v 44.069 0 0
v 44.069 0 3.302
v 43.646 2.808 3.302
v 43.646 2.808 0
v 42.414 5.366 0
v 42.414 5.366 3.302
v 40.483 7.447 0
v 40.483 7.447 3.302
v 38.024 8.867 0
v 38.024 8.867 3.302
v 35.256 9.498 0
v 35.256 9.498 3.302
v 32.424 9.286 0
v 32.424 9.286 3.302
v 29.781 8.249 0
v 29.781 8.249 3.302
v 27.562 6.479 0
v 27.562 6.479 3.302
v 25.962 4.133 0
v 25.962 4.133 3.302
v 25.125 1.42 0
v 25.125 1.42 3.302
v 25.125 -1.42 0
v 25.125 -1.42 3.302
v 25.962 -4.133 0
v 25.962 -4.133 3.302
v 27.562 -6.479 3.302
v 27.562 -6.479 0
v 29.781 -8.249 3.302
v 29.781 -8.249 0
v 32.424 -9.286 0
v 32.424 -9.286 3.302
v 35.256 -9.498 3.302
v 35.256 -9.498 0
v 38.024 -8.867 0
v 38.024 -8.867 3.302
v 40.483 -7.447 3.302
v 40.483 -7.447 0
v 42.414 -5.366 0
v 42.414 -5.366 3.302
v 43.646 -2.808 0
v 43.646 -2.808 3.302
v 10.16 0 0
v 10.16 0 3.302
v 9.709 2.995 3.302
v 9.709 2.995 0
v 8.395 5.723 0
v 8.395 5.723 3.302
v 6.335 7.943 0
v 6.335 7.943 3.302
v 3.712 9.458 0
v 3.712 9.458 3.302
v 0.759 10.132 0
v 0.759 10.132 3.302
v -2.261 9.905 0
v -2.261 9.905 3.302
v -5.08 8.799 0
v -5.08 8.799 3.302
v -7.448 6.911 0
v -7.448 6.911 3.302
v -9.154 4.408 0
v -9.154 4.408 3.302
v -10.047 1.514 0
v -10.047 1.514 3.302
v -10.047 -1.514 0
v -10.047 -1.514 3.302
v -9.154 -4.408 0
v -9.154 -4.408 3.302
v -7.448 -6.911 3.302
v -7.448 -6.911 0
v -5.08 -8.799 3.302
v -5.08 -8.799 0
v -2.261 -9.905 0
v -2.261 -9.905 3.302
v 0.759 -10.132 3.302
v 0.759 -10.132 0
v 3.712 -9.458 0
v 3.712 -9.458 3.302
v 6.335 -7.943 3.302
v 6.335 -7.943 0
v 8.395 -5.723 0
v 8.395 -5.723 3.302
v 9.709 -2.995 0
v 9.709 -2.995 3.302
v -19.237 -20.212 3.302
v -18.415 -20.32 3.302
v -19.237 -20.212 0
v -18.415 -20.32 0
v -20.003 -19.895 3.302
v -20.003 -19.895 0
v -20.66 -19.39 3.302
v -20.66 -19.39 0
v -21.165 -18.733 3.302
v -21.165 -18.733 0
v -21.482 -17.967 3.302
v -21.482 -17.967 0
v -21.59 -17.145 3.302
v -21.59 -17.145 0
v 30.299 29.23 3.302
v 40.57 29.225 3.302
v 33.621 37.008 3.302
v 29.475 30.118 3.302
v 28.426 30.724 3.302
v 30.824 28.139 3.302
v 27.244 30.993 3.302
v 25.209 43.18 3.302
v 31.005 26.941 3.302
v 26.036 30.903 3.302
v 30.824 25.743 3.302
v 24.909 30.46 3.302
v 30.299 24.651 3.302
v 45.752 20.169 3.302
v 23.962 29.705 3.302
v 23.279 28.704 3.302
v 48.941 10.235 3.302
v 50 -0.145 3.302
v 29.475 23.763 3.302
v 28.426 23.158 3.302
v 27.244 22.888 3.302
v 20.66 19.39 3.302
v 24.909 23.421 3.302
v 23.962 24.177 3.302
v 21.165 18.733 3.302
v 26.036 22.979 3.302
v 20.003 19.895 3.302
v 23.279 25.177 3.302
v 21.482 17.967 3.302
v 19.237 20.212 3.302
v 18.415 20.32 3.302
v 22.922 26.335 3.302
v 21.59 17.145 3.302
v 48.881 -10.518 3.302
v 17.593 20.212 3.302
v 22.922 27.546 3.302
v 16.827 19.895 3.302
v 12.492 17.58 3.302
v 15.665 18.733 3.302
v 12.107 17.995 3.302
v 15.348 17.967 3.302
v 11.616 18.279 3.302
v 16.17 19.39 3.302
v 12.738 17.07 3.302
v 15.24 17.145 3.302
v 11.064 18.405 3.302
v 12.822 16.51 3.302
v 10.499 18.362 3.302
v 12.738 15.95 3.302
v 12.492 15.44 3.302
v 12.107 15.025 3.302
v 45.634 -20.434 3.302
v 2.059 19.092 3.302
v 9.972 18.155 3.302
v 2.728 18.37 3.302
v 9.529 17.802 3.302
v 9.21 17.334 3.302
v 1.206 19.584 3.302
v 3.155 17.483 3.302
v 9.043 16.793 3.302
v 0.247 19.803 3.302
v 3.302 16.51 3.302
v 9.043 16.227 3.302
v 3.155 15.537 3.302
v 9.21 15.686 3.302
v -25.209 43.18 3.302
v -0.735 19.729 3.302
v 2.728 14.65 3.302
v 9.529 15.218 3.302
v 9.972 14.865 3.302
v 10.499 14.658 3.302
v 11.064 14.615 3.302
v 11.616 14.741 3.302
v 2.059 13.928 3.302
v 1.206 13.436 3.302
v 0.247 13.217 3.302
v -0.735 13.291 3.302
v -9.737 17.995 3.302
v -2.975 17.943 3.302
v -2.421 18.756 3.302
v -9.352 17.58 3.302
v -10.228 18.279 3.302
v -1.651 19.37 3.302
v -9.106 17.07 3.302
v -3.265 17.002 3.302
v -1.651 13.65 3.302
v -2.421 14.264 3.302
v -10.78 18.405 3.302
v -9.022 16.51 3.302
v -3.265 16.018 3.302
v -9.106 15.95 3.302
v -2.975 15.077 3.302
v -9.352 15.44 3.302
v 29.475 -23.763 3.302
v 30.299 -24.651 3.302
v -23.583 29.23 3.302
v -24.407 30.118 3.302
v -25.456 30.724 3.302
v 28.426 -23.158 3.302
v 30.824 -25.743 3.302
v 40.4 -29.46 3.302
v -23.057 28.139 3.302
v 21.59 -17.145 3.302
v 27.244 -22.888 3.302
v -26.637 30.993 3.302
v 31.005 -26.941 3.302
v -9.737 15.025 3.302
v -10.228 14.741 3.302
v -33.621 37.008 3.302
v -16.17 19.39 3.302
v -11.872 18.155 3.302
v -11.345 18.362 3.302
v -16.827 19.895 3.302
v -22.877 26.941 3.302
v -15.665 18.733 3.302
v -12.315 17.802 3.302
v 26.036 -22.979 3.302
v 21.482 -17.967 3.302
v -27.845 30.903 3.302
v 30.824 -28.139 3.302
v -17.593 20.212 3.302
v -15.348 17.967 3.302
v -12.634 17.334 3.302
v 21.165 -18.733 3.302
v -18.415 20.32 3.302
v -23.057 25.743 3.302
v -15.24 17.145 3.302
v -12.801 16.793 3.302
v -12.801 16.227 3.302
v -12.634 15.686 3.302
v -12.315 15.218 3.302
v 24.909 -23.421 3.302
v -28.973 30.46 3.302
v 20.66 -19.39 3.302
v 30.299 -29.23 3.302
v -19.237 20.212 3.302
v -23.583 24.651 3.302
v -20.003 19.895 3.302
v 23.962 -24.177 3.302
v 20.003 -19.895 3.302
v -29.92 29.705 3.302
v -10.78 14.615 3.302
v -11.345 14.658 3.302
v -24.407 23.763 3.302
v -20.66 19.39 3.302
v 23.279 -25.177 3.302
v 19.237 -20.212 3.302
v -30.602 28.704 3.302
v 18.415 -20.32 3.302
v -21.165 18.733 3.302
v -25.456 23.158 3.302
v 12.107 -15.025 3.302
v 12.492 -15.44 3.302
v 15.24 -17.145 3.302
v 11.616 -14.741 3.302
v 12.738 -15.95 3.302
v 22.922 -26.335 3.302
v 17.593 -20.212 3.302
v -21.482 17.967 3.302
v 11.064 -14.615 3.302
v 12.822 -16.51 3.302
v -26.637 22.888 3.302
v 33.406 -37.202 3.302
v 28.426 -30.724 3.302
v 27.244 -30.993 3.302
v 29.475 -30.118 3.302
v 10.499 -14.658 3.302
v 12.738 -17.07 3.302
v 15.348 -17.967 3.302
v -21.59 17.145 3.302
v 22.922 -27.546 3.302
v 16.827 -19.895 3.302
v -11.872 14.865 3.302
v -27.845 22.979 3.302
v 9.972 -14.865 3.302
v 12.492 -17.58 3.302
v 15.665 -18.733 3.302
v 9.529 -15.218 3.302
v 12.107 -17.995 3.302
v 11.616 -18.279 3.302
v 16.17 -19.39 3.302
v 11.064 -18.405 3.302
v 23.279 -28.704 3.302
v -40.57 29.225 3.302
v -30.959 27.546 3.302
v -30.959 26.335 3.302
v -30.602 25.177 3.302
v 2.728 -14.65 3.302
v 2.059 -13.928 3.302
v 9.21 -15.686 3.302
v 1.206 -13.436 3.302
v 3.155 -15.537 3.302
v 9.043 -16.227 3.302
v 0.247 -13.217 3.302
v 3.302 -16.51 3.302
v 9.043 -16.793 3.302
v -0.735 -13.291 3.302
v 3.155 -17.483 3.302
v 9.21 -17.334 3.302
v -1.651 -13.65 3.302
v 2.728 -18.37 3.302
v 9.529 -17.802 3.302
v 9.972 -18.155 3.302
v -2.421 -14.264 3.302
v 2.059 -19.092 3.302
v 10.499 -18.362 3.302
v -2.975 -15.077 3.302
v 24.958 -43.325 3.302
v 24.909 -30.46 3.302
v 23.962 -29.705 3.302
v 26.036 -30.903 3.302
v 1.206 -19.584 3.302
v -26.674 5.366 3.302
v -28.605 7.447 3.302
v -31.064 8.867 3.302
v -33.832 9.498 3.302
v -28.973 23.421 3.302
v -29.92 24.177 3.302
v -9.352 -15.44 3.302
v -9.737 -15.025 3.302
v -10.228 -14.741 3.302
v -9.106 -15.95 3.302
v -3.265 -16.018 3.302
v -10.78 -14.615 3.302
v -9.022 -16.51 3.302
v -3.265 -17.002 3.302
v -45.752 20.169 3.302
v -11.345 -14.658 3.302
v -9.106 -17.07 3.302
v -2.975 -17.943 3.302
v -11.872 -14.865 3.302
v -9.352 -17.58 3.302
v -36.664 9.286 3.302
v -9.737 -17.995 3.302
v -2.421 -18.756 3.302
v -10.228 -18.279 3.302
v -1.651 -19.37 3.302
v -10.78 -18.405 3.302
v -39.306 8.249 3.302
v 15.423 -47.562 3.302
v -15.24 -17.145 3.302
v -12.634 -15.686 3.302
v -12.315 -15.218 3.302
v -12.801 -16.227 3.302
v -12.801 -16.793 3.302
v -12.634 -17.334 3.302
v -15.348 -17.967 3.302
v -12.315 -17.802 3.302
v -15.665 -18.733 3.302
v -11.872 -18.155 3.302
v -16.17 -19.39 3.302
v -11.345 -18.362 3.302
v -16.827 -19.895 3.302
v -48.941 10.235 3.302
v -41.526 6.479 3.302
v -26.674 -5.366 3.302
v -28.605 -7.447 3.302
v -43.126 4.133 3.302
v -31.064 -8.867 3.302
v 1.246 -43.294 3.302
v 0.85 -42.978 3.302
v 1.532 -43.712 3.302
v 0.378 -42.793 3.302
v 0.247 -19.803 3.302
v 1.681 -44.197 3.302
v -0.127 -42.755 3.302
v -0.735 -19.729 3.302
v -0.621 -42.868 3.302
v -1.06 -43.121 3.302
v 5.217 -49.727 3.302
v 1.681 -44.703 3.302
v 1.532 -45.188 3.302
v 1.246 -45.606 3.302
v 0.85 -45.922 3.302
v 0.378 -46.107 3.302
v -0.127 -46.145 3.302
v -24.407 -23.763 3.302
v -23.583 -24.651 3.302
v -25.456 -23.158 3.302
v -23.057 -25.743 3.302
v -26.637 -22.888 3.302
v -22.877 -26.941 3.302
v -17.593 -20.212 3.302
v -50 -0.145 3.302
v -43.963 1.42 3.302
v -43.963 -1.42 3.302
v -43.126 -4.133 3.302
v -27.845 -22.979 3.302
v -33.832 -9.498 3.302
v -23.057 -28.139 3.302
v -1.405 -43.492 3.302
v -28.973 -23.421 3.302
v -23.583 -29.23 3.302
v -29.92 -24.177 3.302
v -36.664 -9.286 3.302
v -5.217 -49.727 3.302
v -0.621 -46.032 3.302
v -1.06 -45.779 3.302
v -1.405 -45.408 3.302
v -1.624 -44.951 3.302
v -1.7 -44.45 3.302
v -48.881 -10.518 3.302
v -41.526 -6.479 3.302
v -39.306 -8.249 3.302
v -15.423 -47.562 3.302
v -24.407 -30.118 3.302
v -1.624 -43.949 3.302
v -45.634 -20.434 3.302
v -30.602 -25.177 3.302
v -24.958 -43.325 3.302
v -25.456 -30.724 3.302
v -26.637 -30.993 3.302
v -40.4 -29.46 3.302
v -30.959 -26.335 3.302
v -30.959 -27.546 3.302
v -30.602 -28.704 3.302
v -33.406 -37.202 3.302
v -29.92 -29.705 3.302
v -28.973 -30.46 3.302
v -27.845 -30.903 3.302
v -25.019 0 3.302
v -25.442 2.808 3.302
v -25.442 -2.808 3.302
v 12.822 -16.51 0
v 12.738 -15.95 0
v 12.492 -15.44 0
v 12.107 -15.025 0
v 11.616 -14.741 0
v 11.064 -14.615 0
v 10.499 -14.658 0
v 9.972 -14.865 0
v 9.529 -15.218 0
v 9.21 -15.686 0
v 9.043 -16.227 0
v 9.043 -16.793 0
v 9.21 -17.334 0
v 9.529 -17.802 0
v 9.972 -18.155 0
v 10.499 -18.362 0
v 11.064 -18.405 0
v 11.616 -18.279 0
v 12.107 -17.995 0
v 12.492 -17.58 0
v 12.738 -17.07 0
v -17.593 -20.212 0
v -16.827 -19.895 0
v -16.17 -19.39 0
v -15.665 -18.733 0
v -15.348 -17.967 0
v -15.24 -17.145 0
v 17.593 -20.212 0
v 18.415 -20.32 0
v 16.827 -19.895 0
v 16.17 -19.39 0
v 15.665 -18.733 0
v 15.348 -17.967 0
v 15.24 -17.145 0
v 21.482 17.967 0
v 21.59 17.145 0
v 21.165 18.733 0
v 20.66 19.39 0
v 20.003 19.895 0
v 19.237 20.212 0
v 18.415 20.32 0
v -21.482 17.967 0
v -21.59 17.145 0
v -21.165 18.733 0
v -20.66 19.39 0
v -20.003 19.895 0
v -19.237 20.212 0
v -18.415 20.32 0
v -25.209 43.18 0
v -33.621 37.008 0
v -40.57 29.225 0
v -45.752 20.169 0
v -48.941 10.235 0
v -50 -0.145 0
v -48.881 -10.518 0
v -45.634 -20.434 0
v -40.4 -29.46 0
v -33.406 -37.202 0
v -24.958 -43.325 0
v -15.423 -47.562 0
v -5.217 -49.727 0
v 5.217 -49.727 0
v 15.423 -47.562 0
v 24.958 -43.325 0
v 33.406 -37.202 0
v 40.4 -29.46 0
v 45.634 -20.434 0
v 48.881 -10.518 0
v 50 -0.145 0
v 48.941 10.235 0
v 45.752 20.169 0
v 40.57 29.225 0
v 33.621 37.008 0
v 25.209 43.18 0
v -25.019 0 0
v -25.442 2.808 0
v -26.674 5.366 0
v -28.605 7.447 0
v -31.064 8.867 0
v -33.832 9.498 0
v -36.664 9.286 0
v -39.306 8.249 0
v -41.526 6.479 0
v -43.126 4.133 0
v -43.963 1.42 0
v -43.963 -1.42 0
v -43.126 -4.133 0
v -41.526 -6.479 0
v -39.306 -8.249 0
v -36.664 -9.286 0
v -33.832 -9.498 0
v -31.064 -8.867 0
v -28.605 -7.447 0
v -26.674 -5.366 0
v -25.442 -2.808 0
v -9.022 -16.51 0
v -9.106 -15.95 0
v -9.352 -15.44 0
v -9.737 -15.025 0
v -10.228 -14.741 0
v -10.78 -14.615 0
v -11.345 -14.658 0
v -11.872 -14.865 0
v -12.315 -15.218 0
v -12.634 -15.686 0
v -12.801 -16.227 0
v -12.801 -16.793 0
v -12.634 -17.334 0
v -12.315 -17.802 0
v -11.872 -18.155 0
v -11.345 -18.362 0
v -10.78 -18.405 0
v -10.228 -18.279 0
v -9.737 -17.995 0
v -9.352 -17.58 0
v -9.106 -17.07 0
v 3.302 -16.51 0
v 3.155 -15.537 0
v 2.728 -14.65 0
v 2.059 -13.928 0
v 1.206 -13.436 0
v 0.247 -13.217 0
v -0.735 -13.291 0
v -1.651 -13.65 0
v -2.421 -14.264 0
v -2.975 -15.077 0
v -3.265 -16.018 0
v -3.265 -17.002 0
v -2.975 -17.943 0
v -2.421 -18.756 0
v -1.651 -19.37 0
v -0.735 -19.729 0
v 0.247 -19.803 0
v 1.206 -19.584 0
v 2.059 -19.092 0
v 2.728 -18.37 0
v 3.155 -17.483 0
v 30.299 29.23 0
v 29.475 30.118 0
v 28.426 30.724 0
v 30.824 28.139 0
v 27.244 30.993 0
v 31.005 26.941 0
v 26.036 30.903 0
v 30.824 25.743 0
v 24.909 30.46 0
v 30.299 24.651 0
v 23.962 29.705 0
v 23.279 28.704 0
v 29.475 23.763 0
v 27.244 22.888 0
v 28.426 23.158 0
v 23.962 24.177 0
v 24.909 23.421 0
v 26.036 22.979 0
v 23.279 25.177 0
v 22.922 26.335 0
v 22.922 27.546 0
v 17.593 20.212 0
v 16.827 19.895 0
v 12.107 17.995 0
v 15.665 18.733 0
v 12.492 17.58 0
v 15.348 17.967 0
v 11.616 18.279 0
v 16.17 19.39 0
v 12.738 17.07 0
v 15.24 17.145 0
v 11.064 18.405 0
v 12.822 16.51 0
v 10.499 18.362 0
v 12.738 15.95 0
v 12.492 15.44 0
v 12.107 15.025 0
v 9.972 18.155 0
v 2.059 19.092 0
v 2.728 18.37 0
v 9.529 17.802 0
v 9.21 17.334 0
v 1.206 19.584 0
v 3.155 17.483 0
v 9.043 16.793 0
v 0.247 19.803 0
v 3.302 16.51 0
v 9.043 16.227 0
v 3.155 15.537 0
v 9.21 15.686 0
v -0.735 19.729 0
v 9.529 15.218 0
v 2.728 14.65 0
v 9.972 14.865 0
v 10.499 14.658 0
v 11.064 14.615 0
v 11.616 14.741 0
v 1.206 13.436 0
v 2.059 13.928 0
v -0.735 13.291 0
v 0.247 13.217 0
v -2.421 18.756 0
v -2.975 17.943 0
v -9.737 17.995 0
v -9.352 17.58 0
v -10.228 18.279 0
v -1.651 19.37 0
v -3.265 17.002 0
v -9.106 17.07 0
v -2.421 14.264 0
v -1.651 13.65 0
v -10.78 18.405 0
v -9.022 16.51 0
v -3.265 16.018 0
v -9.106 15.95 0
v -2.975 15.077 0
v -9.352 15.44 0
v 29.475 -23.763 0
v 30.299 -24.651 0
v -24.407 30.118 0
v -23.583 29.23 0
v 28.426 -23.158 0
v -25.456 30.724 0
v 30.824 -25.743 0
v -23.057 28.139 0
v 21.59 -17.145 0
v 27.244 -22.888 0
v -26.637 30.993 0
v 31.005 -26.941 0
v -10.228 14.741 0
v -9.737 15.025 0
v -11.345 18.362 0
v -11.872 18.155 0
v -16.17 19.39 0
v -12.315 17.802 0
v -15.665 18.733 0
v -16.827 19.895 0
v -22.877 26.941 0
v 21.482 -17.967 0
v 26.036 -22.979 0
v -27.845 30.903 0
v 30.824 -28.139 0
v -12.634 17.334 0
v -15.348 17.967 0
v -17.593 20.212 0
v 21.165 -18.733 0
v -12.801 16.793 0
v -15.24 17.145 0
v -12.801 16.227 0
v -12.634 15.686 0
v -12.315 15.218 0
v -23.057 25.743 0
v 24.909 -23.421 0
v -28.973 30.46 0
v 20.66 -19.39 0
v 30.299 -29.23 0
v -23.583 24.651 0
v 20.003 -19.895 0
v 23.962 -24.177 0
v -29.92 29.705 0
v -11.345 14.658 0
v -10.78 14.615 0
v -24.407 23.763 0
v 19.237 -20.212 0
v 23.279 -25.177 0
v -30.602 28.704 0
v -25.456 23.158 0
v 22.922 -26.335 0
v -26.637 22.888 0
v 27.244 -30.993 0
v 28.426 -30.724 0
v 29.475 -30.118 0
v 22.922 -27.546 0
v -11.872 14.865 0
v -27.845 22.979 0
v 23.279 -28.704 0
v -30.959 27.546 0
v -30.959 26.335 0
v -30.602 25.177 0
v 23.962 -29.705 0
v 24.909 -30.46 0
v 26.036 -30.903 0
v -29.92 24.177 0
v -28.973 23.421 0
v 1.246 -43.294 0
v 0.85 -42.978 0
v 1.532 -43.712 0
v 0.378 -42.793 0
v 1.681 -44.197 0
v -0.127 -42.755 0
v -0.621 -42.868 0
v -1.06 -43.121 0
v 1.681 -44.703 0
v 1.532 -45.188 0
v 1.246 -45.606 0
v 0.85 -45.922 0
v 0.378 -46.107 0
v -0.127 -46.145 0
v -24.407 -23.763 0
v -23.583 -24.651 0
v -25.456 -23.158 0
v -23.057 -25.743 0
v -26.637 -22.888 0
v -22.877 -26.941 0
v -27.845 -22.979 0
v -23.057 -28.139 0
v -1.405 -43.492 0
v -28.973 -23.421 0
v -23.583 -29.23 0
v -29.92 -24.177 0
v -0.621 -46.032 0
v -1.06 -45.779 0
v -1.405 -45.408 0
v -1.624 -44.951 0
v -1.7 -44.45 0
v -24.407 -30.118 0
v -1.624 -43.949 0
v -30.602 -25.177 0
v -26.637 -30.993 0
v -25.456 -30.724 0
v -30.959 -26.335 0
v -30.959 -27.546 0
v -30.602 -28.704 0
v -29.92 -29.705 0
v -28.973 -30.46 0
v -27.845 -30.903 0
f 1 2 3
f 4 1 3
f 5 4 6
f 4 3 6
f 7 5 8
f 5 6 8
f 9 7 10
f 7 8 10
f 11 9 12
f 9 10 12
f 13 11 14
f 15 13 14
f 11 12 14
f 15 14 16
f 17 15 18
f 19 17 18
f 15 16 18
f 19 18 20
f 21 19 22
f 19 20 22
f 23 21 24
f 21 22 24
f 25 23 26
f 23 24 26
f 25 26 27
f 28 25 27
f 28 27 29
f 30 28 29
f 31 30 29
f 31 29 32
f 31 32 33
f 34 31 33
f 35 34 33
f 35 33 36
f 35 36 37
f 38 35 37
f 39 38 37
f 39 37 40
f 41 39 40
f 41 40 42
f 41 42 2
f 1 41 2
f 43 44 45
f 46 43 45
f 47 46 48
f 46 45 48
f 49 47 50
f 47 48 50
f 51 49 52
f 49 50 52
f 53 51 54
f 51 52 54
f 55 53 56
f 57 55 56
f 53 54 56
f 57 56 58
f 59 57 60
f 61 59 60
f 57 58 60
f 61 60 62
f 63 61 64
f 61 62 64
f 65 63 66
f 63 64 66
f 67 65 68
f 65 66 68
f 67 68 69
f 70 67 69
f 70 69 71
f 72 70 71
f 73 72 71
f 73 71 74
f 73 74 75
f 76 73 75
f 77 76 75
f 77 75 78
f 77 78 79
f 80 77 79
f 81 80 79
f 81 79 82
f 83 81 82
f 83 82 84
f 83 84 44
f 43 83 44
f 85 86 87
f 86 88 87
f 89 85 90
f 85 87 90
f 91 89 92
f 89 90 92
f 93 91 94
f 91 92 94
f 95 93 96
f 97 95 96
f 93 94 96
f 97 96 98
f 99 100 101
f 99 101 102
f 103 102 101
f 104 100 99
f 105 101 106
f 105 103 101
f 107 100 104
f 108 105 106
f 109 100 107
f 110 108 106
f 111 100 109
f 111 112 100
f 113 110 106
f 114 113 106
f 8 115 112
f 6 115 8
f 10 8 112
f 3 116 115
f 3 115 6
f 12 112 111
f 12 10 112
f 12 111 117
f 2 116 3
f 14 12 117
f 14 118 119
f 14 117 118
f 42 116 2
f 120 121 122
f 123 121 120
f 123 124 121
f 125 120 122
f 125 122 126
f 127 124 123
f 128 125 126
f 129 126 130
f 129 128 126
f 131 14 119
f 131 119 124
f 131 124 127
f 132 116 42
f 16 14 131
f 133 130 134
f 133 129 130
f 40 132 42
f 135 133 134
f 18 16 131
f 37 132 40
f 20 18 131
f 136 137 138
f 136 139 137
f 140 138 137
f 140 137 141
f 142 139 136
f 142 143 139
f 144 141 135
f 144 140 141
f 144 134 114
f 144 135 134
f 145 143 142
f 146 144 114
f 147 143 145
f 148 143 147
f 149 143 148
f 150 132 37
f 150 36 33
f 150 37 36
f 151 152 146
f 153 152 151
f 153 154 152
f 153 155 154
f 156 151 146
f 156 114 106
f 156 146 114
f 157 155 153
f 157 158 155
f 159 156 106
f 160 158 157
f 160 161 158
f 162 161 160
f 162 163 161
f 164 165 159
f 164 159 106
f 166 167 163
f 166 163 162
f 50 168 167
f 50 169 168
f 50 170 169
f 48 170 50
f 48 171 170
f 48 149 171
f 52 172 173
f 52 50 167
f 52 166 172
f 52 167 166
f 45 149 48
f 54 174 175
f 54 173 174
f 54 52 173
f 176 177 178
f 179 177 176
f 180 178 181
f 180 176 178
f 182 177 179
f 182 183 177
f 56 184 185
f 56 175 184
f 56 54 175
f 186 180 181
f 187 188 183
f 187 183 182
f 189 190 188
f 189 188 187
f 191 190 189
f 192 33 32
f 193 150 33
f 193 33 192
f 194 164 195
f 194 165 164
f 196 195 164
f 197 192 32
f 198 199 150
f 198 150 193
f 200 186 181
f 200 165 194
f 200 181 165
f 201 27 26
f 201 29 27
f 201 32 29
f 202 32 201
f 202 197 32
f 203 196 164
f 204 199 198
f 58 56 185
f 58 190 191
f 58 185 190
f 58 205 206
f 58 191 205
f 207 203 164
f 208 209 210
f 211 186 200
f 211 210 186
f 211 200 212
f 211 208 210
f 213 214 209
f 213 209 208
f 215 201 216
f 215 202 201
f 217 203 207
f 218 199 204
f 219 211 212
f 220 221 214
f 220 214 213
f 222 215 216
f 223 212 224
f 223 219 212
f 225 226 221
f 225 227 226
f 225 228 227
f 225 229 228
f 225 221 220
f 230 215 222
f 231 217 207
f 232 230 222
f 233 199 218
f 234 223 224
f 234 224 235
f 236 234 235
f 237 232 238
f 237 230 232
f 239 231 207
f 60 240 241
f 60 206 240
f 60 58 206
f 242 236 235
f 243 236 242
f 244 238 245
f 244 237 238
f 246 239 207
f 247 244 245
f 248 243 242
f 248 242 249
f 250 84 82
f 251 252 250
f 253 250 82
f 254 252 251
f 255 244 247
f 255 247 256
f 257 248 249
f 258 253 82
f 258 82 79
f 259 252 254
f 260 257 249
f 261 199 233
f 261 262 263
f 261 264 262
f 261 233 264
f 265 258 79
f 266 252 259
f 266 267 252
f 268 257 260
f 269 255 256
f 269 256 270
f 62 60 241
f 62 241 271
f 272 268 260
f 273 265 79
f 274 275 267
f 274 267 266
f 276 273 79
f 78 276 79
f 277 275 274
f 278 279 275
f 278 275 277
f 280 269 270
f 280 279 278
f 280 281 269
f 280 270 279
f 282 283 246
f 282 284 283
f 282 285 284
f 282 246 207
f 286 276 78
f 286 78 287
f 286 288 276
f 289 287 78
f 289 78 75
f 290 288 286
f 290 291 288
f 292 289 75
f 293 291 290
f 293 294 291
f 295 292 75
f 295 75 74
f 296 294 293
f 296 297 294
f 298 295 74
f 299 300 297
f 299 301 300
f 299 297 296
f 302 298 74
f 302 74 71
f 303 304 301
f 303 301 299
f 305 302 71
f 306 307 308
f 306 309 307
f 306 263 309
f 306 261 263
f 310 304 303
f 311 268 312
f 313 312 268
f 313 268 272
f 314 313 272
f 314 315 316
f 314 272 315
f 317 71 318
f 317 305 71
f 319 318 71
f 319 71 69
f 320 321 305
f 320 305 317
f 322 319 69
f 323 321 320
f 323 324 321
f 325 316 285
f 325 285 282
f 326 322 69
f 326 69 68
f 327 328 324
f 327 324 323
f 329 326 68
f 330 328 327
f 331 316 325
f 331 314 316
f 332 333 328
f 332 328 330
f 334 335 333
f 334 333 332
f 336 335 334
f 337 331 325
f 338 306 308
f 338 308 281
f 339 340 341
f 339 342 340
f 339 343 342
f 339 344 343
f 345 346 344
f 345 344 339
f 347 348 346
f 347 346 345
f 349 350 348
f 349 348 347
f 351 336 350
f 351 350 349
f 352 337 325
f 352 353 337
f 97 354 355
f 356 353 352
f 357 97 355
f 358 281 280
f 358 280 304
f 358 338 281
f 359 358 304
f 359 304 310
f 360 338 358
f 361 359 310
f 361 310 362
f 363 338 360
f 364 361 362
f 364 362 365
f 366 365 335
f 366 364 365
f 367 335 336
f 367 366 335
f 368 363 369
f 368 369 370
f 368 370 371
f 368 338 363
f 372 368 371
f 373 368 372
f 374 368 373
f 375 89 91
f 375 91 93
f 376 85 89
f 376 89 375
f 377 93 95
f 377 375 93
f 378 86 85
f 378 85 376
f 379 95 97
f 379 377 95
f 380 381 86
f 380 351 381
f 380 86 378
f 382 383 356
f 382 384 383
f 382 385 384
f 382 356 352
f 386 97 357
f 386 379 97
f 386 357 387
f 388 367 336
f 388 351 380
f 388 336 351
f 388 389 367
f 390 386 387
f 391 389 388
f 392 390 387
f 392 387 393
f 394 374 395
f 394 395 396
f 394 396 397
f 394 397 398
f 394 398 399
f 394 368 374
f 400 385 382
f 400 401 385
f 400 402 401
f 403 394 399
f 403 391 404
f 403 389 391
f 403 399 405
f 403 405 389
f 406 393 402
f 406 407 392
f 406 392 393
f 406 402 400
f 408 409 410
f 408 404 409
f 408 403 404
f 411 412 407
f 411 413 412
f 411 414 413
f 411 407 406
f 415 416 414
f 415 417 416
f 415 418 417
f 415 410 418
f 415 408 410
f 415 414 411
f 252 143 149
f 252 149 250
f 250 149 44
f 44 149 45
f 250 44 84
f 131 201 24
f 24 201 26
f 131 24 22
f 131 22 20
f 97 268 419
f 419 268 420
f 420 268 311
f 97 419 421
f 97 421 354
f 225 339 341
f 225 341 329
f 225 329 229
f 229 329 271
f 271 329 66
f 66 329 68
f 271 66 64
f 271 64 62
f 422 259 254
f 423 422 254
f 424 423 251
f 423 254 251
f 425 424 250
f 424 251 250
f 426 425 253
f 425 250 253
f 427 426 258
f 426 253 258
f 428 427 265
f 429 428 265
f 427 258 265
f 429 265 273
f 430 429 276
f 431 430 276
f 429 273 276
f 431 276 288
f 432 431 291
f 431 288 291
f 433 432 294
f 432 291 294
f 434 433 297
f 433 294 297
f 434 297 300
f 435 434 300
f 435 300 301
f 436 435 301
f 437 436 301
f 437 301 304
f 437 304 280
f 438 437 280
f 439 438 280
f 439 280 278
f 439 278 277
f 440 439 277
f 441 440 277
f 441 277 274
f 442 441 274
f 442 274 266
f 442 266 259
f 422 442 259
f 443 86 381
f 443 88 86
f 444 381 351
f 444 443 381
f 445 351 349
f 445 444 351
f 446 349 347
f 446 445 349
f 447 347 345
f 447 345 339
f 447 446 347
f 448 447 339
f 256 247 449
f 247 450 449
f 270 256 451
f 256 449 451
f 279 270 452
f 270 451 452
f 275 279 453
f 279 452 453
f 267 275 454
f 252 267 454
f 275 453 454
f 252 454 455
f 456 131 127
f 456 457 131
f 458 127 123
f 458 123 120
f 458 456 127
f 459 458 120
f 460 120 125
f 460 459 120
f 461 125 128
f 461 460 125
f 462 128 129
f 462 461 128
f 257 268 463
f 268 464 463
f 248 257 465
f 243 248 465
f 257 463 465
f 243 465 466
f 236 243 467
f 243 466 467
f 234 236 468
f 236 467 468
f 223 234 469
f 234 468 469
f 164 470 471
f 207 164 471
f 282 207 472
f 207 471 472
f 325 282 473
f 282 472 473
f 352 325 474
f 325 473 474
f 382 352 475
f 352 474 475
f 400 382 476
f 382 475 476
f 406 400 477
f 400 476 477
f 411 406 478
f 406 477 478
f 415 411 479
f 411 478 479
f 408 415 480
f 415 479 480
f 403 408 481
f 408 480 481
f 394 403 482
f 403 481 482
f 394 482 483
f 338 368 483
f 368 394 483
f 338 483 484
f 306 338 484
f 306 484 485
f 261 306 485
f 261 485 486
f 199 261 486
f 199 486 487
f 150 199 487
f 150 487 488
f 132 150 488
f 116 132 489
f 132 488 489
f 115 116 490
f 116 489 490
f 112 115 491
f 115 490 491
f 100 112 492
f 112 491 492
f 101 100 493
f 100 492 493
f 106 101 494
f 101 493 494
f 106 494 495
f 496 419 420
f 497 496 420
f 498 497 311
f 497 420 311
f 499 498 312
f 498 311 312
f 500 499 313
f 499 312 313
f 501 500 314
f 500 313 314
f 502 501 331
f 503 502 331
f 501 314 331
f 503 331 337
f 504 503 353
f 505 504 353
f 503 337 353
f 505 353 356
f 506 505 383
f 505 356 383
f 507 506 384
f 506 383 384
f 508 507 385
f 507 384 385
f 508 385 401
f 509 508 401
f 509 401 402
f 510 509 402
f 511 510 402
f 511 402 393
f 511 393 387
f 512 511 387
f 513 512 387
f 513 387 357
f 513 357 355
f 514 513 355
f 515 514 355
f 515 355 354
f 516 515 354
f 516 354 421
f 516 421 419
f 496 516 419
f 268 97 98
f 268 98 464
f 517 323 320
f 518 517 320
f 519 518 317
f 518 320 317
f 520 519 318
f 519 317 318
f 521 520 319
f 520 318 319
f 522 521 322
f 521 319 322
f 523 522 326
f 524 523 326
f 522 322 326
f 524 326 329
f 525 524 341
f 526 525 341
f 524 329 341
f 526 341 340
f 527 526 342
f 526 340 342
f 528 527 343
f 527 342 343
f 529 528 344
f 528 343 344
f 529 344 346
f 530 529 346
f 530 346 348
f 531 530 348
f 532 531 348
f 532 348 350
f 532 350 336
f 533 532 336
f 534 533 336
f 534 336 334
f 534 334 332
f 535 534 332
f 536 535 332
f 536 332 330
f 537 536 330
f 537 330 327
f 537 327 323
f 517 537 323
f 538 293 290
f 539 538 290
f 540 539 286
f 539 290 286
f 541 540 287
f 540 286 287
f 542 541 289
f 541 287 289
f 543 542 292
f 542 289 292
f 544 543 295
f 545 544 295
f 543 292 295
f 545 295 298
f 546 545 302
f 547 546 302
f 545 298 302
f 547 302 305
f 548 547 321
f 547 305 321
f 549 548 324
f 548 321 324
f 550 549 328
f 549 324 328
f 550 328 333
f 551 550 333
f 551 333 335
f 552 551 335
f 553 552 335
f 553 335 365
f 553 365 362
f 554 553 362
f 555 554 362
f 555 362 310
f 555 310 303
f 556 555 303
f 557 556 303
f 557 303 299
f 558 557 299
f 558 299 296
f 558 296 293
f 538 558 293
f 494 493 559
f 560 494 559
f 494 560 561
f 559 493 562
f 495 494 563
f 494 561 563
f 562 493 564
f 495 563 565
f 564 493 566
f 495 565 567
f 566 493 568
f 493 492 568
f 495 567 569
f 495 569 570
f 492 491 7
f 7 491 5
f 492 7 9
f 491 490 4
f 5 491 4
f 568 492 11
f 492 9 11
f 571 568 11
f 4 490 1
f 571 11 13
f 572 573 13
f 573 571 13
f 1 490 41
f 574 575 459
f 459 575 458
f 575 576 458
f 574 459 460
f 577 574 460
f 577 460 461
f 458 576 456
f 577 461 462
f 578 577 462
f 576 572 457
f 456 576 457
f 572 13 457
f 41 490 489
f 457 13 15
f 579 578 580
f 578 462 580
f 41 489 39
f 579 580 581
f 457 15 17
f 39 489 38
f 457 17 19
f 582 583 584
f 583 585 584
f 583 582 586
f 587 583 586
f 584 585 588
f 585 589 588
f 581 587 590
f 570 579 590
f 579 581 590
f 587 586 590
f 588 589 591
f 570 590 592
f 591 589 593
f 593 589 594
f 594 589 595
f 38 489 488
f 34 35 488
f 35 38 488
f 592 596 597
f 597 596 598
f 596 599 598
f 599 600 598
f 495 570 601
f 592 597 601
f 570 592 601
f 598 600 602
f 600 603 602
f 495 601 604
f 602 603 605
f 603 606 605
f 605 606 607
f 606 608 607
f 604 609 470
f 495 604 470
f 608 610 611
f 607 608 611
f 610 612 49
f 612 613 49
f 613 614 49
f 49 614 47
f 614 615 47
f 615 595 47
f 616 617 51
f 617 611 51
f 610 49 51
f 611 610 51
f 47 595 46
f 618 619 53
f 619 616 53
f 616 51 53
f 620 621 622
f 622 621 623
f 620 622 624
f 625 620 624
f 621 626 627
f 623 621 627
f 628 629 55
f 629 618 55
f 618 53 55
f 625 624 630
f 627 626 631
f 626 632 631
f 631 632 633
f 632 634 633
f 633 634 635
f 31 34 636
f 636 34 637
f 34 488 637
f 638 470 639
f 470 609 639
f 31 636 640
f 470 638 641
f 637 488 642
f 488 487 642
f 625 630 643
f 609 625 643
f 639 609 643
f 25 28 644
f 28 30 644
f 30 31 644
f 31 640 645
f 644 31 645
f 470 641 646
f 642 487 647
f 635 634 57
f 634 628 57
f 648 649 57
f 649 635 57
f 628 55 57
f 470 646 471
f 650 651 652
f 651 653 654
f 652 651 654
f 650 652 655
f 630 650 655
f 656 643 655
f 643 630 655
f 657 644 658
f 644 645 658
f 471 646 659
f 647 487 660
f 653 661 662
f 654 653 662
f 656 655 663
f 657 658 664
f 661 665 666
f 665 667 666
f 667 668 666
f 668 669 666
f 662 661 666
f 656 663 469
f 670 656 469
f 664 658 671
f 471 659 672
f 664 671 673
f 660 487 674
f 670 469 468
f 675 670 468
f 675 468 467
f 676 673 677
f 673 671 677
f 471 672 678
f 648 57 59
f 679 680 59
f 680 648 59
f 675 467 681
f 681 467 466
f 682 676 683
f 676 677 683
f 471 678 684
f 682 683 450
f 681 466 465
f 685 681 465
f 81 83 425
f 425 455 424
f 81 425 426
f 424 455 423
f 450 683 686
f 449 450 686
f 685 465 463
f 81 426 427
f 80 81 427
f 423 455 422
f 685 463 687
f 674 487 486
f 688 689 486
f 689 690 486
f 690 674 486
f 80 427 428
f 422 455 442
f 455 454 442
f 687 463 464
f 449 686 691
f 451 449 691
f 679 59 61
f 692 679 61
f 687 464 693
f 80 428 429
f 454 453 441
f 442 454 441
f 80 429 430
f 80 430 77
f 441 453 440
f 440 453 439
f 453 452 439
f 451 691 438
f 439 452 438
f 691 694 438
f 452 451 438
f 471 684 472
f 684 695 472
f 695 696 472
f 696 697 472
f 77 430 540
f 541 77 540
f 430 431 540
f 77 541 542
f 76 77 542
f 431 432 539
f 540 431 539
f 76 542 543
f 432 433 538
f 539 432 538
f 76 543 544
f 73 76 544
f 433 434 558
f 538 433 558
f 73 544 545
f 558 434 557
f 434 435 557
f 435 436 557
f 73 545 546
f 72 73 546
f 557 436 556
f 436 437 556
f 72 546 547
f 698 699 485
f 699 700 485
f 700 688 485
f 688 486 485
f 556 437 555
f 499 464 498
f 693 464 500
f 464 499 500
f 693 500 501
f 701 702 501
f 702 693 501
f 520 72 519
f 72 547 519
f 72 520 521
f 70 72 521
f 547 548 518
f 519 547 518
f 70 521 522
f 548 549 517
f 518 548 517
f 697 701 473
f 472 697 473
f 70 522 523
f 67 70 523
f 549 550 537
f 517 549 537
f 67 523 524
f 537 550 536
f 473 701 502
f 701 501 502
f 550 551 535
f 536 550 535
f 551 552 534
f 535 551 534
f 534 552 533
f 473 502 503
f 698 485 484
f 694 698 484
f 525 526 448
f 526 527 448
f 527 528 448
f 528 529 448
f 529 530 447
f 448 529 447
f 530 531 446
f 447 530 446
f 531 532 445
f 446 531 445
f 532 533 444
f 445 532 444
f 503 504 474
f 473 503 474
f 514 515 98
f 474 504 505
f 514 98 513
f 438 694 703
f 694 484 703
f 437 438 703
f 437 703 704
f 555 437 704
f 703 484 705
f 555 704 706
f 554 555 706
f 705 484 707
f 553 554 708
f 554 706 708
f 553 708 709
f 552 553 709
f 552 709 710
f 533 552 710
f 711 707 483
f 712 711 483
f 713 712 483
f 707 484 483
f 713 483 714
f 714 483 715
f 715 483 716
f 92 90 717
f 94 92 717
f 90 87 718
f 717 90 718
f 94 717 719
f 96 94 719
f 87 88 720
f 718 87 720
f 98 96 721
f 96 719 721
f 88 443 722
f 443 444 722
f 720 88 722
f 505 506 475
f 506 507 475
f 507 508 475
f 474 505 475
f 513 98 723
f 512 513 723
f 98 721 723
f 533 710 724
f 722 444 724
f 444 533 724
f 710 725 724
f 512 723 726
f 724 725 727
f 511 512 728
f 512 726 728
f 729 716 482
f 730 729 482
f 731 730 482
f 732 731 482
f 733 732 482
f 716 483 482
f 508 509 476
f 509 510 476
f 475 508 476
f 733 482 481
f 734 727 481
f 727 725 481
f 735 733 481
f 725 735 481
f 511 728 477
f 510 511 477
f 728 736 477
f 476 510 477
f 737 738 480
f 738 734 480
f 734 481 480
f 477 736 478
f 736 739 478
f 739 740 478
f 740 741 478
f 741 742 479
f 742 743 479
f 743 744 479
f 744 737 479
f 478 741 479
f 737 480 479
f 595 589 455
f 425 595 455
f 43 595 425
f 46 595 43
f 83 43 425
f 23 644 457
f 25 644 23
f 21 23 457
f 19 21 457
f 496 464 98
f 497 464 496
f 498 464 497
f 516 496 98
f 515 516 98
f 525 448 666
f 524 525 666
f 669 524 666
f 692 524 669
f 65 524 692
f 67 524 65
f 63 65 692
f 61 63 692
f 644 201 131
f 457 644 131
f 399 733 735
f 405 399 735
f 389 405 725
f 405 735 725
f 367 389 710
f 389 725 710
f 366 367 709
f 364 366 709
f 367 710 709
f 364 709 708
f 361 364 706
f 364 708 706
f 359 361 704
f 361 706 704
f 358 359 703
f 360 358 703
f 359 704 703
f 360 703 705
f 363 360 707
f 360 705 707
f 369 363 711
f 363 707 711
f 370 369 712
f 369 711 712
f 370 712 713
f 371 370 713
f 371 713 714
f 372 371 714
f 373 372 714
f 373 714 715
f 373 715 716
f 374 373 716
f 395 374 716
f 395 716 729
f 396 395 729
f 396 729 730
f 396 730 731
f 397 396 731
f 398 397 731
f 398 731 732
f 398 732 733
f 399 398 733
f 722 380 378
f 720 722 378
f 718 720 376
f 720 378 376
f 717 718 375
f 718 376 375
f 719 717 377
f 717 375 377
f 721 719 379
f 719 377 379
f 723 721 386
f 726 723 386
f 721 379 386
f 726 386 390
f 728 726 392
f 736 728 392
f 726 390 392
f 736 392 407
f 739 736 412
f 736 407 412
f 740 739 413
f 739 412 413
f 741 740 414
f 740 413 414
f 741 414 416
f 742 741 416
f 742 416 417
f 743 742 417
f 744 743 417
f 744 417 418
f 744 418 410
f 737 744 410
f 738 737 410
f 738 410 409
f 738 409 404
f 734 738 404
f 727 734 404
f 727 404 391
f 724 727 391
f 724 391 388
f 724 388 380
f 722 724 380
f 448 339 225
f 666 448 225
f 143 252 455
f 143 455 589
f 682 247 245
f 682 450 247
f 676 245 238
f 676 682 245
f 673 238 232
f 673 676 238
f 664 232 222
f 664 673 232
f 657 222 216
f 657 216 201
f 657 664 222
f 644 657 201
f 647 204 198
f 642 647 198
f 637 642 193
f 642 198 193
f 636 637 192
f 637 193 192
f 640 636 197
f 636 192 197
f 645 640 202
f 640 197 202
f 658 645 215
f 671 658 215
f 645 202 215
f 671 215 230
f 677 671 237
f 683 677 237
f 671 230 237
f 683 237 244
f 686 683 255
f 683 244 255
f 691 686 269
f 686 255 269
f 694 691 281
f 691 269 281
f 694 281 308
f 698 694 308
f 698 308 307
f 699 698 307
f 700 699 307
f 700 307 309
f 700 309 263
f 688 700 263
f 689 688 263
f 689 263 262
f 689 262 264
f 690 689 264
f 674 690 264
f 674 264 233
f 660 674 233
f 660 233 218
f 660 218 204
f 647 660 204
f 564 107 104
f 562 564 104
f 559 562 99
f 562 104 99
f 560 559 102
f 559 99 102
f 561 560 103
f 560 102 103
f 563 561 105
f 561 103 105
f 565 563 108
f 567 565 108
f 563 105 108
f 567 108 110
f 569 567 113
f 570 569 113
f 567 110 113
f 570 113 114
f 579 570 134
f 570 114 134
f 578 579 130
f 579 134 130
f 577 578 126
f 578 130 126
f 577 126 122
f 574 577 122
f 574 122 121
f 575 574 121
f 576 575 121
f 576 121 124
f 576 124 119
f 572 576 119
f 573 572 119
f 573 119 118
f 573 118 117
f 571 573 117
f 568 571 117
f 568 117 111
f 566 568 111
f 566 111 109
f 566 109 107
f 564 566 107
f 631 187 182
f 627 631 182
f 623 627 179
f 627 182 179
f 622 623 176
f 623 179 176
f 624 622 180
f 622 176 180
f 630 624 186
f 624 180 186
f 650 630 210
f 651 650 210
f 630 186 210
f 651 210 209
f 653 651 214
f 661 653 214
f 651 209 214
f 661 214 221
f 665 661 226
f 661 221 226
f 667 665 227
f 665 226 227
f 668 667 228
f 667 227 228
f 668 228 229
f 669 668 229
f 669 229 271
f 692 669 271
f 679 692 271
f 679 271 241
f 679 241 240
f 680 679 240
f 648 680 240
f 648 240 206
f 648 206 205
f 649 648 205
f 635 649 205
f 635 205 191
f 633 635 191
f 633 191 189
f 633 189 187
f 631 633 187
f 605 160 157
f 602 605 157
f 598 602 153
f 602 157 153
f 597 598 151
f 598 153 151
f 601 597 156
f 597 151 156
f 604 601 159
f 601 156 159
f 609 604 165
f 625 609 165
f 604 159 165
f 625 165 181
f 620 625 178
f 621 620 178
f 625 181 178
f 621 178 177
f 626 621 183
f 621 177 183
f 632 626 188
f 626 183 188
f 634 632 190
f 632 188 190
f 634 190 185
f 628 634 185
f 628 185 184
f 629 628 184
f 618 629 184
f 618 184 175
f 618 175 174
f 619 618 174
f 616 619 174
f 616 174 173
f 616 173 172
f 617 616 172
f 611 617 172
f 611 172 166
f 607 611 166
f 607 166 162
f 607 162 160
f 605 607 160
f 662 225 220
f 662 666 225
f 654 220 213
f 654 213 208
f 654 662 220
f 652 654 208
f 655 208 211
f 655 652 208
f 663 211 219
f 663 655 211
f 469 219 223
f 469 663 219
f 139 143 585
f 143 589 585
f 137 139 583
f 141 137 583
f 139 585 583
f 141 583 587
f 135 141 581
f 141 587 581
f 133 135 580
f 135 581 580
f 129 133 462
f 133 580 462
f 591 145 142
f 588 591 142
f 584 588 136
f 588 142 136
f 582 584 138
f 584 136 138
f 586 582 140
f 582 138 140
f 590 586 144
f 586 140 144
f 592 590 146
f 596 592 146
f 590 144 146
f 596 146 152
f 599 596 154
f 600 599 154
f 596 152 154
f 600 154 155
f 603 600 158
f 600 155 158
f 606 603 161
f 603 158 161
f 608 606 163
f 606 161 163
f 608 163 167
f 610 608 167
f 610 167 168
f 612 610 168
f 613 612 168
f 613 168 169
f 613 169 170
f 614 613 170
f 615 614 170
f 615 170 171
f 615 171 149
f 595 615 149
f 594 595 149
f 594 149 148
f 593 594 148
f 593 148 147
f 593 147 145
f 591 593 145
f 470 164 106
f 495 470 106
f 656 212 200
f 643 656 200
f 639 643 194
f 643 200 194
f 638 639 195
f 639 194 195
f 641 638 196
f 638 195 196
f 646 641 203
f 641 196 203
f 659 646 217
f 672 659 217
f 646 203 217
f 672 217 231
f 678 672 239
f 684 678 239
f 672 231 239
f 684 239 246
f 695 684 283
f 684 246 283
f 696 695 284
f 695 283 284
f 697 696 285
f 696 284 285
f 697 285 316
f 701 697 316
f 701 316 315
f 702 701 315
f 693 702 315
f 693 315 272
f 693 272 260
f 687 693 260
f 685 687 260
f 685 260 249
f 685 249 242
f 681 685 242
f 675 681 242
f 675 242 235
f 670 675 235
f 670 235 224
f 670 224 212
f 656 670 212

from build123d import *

# Parameters (mm, degrees)
SKETCH_1_R               = 50
EXTRUDE_1_DEPTH          = 3.302
SKETCH_2_R               = 4.064
CUT_EXTRUDE_1_DEPTH      = 71.787733429
SKETCH_3_W               = 50.417758776
SKETCH_3_H               = 15.226983209
CUT_EXTRUDE_2_DEPTH      = 71.787733429
SKETCH_4_R               = 10.16
CUT_EXTRUDE_3_DEPTH      = 71.787733429
SKETCH_8_R               = 9.525
SKETCH_8_W               = 6.35
SKETCH_8_H               = 40.64
CUT_EXTRUDE_4_DEPTH      = 71.787733429
SKETCH_9_R               = 1.9
SKETCH_9_R_2             = 3.302
CUT_EXTRUDE_5_DEPTH      = 71.787733429
FILLET1_R                = 3.175
M3_CLEARANCE_HOLE1_D     = 3.4
M3_CLEARANCE_HOLE1_DEPTH = 25.4
M3_CLEARANCE_HOLE1_TIP   = 1.021463052


with BuildPart() as part:
    # 草图1 → 凸台-拉伸1 (new body)
    with BuildSketch(Plane.XY):
        with Locations(Location((0, 0, 0), (0, 0, 180))):
            Circle(SKETCH_1_R)
    extrude(amount=EXTRUDE_1_DEPTH)

    # 草图2 → 切除-拉伸1 (cut, through all)
    with BuildSketch(Plane.XY.offset(3.302)):
        with Locations((-26.940768363, 26.940768363)):
            Circle(SKETCH_2_R)
        with Locations((-26.940768363, -26.940768363)):
            Circle(SKETCH_2_R)
        with Locations((26.940768363, -26.940768363)):
            Circle(SKETCH_2_R)
        with Locations((26.940768363, 26.940768363)):
            Circle(SKETCH_2_R)
    extrude(amount=-CUT_EXTRUDE_1_DEPTH, mode=Mode.SUBTRACT)

    # 草图3 → 切除-拉伸2 (cut, through all)
    with BuildSketch(Plane.XY.offset(3.302)):
        with Locations((0, 50.793491605)):
            Rectangle(SKETCH_3_W, SKETCH_3_H)
    extrude(amount=-CUT_EXTRUDE_2_DEPTH, mode=Mode.SUBTRACT)

    # 草图4 → 切除-拉伸3 (cut, through all)
    with BuildSketch(Plane.XY.offset(3.302)):
        Circle(SKETCH_4_R)
    extrude(amount=-CUT_EXTRUDE_3_DEPTH, mode=Mode.SUBTRACT)

    # 草图8 → 切除-拉伸4 (cut, through all)
    with BuildSketch(Plane.XY.offset(3.302)):
        with Locations((34.544, 0)):
            Circle(SKETCH_8_R)
        with Locations((-34.544, 0)):
            Circle(SKETCH_8_R)
        with Locations((18.415, 0)):
            Rectangle(SKETCH_8_W, SKETCH_8_H)
        with Locations((-18.415, 0)):
            Rectangle(SKETCH_8_W, SKETCH_8_H)
    extrude(amount=-CUT_EXTRUDE_4_DEPTH, mode=Mode.SUBTRACT)

    # 草图9 → 切除-拉伸5 (cut, through all)
    with BuildSketch(Plane.XY.offset(3.302)):
        with Locations((-10.922, 16.51)):
            Circle(SKETCH_9_R)
        with Locations((10.922, 16.51)):
            Circle(SKETCH_9_R)
        with Locations((-10.922, -16.51)):
            Circle(SKETCH_9_R)
        with Locations((10.922, -16.51)):
            Circle(SKETCH_9_R)
        with Locations((0, 16.51)):
            Circle(SKETCH_9_R_2)
        with Locations((0, -16.51)):
            Circle(SKETCH_9_R_2)
    extrude(amount=-CUT_EXTRUDE_5_DEPTH, mode=Mode.SUBTRACT)

    # Fillet1
    fillet1_edges = [part.edges().sort_by_distance(p)[0] for p in [
        (15.24, 20.32, 1.651),
        (21.59, 20.32, 1.651),
        (21.59, -20.32, 1.651),
        (15.24, -20.32, 1.651),
        (-15.24, -20.32, 1.651),
        (-21.59, -20.32, 1.651),
        (-15.24, 20.32, 1.651),
        (-21.59, 20.32, 1.651),
    ]]
    fillet(fillet1_edges, radius=FILLET1_R - 0.0001)  # a hair under: the kernel refuses the full size

    # M3 Clearance Hole1
    with Locations(Plane.XY.offset(3.302)):
        with Locations((0, -44.45)):
            Hole(M3_CLEARANCE_HOLE1_D / 2, depth=M3_CLEARANCE_HOLE1_DEPTH)
            with Locations((0, 0, -(M3_CLEARANCE_HOLE1_DEPTH + M3_CLEARANCE_HOLE1_TIP / 2))):  # 118° drill point
                Cone(0, M3_CLEARANCE_HOLE1_D / 2, M3_CLEARANCE_HOLE1_TIP, mode=Mode.SUBTRACT)


solid = part.part
